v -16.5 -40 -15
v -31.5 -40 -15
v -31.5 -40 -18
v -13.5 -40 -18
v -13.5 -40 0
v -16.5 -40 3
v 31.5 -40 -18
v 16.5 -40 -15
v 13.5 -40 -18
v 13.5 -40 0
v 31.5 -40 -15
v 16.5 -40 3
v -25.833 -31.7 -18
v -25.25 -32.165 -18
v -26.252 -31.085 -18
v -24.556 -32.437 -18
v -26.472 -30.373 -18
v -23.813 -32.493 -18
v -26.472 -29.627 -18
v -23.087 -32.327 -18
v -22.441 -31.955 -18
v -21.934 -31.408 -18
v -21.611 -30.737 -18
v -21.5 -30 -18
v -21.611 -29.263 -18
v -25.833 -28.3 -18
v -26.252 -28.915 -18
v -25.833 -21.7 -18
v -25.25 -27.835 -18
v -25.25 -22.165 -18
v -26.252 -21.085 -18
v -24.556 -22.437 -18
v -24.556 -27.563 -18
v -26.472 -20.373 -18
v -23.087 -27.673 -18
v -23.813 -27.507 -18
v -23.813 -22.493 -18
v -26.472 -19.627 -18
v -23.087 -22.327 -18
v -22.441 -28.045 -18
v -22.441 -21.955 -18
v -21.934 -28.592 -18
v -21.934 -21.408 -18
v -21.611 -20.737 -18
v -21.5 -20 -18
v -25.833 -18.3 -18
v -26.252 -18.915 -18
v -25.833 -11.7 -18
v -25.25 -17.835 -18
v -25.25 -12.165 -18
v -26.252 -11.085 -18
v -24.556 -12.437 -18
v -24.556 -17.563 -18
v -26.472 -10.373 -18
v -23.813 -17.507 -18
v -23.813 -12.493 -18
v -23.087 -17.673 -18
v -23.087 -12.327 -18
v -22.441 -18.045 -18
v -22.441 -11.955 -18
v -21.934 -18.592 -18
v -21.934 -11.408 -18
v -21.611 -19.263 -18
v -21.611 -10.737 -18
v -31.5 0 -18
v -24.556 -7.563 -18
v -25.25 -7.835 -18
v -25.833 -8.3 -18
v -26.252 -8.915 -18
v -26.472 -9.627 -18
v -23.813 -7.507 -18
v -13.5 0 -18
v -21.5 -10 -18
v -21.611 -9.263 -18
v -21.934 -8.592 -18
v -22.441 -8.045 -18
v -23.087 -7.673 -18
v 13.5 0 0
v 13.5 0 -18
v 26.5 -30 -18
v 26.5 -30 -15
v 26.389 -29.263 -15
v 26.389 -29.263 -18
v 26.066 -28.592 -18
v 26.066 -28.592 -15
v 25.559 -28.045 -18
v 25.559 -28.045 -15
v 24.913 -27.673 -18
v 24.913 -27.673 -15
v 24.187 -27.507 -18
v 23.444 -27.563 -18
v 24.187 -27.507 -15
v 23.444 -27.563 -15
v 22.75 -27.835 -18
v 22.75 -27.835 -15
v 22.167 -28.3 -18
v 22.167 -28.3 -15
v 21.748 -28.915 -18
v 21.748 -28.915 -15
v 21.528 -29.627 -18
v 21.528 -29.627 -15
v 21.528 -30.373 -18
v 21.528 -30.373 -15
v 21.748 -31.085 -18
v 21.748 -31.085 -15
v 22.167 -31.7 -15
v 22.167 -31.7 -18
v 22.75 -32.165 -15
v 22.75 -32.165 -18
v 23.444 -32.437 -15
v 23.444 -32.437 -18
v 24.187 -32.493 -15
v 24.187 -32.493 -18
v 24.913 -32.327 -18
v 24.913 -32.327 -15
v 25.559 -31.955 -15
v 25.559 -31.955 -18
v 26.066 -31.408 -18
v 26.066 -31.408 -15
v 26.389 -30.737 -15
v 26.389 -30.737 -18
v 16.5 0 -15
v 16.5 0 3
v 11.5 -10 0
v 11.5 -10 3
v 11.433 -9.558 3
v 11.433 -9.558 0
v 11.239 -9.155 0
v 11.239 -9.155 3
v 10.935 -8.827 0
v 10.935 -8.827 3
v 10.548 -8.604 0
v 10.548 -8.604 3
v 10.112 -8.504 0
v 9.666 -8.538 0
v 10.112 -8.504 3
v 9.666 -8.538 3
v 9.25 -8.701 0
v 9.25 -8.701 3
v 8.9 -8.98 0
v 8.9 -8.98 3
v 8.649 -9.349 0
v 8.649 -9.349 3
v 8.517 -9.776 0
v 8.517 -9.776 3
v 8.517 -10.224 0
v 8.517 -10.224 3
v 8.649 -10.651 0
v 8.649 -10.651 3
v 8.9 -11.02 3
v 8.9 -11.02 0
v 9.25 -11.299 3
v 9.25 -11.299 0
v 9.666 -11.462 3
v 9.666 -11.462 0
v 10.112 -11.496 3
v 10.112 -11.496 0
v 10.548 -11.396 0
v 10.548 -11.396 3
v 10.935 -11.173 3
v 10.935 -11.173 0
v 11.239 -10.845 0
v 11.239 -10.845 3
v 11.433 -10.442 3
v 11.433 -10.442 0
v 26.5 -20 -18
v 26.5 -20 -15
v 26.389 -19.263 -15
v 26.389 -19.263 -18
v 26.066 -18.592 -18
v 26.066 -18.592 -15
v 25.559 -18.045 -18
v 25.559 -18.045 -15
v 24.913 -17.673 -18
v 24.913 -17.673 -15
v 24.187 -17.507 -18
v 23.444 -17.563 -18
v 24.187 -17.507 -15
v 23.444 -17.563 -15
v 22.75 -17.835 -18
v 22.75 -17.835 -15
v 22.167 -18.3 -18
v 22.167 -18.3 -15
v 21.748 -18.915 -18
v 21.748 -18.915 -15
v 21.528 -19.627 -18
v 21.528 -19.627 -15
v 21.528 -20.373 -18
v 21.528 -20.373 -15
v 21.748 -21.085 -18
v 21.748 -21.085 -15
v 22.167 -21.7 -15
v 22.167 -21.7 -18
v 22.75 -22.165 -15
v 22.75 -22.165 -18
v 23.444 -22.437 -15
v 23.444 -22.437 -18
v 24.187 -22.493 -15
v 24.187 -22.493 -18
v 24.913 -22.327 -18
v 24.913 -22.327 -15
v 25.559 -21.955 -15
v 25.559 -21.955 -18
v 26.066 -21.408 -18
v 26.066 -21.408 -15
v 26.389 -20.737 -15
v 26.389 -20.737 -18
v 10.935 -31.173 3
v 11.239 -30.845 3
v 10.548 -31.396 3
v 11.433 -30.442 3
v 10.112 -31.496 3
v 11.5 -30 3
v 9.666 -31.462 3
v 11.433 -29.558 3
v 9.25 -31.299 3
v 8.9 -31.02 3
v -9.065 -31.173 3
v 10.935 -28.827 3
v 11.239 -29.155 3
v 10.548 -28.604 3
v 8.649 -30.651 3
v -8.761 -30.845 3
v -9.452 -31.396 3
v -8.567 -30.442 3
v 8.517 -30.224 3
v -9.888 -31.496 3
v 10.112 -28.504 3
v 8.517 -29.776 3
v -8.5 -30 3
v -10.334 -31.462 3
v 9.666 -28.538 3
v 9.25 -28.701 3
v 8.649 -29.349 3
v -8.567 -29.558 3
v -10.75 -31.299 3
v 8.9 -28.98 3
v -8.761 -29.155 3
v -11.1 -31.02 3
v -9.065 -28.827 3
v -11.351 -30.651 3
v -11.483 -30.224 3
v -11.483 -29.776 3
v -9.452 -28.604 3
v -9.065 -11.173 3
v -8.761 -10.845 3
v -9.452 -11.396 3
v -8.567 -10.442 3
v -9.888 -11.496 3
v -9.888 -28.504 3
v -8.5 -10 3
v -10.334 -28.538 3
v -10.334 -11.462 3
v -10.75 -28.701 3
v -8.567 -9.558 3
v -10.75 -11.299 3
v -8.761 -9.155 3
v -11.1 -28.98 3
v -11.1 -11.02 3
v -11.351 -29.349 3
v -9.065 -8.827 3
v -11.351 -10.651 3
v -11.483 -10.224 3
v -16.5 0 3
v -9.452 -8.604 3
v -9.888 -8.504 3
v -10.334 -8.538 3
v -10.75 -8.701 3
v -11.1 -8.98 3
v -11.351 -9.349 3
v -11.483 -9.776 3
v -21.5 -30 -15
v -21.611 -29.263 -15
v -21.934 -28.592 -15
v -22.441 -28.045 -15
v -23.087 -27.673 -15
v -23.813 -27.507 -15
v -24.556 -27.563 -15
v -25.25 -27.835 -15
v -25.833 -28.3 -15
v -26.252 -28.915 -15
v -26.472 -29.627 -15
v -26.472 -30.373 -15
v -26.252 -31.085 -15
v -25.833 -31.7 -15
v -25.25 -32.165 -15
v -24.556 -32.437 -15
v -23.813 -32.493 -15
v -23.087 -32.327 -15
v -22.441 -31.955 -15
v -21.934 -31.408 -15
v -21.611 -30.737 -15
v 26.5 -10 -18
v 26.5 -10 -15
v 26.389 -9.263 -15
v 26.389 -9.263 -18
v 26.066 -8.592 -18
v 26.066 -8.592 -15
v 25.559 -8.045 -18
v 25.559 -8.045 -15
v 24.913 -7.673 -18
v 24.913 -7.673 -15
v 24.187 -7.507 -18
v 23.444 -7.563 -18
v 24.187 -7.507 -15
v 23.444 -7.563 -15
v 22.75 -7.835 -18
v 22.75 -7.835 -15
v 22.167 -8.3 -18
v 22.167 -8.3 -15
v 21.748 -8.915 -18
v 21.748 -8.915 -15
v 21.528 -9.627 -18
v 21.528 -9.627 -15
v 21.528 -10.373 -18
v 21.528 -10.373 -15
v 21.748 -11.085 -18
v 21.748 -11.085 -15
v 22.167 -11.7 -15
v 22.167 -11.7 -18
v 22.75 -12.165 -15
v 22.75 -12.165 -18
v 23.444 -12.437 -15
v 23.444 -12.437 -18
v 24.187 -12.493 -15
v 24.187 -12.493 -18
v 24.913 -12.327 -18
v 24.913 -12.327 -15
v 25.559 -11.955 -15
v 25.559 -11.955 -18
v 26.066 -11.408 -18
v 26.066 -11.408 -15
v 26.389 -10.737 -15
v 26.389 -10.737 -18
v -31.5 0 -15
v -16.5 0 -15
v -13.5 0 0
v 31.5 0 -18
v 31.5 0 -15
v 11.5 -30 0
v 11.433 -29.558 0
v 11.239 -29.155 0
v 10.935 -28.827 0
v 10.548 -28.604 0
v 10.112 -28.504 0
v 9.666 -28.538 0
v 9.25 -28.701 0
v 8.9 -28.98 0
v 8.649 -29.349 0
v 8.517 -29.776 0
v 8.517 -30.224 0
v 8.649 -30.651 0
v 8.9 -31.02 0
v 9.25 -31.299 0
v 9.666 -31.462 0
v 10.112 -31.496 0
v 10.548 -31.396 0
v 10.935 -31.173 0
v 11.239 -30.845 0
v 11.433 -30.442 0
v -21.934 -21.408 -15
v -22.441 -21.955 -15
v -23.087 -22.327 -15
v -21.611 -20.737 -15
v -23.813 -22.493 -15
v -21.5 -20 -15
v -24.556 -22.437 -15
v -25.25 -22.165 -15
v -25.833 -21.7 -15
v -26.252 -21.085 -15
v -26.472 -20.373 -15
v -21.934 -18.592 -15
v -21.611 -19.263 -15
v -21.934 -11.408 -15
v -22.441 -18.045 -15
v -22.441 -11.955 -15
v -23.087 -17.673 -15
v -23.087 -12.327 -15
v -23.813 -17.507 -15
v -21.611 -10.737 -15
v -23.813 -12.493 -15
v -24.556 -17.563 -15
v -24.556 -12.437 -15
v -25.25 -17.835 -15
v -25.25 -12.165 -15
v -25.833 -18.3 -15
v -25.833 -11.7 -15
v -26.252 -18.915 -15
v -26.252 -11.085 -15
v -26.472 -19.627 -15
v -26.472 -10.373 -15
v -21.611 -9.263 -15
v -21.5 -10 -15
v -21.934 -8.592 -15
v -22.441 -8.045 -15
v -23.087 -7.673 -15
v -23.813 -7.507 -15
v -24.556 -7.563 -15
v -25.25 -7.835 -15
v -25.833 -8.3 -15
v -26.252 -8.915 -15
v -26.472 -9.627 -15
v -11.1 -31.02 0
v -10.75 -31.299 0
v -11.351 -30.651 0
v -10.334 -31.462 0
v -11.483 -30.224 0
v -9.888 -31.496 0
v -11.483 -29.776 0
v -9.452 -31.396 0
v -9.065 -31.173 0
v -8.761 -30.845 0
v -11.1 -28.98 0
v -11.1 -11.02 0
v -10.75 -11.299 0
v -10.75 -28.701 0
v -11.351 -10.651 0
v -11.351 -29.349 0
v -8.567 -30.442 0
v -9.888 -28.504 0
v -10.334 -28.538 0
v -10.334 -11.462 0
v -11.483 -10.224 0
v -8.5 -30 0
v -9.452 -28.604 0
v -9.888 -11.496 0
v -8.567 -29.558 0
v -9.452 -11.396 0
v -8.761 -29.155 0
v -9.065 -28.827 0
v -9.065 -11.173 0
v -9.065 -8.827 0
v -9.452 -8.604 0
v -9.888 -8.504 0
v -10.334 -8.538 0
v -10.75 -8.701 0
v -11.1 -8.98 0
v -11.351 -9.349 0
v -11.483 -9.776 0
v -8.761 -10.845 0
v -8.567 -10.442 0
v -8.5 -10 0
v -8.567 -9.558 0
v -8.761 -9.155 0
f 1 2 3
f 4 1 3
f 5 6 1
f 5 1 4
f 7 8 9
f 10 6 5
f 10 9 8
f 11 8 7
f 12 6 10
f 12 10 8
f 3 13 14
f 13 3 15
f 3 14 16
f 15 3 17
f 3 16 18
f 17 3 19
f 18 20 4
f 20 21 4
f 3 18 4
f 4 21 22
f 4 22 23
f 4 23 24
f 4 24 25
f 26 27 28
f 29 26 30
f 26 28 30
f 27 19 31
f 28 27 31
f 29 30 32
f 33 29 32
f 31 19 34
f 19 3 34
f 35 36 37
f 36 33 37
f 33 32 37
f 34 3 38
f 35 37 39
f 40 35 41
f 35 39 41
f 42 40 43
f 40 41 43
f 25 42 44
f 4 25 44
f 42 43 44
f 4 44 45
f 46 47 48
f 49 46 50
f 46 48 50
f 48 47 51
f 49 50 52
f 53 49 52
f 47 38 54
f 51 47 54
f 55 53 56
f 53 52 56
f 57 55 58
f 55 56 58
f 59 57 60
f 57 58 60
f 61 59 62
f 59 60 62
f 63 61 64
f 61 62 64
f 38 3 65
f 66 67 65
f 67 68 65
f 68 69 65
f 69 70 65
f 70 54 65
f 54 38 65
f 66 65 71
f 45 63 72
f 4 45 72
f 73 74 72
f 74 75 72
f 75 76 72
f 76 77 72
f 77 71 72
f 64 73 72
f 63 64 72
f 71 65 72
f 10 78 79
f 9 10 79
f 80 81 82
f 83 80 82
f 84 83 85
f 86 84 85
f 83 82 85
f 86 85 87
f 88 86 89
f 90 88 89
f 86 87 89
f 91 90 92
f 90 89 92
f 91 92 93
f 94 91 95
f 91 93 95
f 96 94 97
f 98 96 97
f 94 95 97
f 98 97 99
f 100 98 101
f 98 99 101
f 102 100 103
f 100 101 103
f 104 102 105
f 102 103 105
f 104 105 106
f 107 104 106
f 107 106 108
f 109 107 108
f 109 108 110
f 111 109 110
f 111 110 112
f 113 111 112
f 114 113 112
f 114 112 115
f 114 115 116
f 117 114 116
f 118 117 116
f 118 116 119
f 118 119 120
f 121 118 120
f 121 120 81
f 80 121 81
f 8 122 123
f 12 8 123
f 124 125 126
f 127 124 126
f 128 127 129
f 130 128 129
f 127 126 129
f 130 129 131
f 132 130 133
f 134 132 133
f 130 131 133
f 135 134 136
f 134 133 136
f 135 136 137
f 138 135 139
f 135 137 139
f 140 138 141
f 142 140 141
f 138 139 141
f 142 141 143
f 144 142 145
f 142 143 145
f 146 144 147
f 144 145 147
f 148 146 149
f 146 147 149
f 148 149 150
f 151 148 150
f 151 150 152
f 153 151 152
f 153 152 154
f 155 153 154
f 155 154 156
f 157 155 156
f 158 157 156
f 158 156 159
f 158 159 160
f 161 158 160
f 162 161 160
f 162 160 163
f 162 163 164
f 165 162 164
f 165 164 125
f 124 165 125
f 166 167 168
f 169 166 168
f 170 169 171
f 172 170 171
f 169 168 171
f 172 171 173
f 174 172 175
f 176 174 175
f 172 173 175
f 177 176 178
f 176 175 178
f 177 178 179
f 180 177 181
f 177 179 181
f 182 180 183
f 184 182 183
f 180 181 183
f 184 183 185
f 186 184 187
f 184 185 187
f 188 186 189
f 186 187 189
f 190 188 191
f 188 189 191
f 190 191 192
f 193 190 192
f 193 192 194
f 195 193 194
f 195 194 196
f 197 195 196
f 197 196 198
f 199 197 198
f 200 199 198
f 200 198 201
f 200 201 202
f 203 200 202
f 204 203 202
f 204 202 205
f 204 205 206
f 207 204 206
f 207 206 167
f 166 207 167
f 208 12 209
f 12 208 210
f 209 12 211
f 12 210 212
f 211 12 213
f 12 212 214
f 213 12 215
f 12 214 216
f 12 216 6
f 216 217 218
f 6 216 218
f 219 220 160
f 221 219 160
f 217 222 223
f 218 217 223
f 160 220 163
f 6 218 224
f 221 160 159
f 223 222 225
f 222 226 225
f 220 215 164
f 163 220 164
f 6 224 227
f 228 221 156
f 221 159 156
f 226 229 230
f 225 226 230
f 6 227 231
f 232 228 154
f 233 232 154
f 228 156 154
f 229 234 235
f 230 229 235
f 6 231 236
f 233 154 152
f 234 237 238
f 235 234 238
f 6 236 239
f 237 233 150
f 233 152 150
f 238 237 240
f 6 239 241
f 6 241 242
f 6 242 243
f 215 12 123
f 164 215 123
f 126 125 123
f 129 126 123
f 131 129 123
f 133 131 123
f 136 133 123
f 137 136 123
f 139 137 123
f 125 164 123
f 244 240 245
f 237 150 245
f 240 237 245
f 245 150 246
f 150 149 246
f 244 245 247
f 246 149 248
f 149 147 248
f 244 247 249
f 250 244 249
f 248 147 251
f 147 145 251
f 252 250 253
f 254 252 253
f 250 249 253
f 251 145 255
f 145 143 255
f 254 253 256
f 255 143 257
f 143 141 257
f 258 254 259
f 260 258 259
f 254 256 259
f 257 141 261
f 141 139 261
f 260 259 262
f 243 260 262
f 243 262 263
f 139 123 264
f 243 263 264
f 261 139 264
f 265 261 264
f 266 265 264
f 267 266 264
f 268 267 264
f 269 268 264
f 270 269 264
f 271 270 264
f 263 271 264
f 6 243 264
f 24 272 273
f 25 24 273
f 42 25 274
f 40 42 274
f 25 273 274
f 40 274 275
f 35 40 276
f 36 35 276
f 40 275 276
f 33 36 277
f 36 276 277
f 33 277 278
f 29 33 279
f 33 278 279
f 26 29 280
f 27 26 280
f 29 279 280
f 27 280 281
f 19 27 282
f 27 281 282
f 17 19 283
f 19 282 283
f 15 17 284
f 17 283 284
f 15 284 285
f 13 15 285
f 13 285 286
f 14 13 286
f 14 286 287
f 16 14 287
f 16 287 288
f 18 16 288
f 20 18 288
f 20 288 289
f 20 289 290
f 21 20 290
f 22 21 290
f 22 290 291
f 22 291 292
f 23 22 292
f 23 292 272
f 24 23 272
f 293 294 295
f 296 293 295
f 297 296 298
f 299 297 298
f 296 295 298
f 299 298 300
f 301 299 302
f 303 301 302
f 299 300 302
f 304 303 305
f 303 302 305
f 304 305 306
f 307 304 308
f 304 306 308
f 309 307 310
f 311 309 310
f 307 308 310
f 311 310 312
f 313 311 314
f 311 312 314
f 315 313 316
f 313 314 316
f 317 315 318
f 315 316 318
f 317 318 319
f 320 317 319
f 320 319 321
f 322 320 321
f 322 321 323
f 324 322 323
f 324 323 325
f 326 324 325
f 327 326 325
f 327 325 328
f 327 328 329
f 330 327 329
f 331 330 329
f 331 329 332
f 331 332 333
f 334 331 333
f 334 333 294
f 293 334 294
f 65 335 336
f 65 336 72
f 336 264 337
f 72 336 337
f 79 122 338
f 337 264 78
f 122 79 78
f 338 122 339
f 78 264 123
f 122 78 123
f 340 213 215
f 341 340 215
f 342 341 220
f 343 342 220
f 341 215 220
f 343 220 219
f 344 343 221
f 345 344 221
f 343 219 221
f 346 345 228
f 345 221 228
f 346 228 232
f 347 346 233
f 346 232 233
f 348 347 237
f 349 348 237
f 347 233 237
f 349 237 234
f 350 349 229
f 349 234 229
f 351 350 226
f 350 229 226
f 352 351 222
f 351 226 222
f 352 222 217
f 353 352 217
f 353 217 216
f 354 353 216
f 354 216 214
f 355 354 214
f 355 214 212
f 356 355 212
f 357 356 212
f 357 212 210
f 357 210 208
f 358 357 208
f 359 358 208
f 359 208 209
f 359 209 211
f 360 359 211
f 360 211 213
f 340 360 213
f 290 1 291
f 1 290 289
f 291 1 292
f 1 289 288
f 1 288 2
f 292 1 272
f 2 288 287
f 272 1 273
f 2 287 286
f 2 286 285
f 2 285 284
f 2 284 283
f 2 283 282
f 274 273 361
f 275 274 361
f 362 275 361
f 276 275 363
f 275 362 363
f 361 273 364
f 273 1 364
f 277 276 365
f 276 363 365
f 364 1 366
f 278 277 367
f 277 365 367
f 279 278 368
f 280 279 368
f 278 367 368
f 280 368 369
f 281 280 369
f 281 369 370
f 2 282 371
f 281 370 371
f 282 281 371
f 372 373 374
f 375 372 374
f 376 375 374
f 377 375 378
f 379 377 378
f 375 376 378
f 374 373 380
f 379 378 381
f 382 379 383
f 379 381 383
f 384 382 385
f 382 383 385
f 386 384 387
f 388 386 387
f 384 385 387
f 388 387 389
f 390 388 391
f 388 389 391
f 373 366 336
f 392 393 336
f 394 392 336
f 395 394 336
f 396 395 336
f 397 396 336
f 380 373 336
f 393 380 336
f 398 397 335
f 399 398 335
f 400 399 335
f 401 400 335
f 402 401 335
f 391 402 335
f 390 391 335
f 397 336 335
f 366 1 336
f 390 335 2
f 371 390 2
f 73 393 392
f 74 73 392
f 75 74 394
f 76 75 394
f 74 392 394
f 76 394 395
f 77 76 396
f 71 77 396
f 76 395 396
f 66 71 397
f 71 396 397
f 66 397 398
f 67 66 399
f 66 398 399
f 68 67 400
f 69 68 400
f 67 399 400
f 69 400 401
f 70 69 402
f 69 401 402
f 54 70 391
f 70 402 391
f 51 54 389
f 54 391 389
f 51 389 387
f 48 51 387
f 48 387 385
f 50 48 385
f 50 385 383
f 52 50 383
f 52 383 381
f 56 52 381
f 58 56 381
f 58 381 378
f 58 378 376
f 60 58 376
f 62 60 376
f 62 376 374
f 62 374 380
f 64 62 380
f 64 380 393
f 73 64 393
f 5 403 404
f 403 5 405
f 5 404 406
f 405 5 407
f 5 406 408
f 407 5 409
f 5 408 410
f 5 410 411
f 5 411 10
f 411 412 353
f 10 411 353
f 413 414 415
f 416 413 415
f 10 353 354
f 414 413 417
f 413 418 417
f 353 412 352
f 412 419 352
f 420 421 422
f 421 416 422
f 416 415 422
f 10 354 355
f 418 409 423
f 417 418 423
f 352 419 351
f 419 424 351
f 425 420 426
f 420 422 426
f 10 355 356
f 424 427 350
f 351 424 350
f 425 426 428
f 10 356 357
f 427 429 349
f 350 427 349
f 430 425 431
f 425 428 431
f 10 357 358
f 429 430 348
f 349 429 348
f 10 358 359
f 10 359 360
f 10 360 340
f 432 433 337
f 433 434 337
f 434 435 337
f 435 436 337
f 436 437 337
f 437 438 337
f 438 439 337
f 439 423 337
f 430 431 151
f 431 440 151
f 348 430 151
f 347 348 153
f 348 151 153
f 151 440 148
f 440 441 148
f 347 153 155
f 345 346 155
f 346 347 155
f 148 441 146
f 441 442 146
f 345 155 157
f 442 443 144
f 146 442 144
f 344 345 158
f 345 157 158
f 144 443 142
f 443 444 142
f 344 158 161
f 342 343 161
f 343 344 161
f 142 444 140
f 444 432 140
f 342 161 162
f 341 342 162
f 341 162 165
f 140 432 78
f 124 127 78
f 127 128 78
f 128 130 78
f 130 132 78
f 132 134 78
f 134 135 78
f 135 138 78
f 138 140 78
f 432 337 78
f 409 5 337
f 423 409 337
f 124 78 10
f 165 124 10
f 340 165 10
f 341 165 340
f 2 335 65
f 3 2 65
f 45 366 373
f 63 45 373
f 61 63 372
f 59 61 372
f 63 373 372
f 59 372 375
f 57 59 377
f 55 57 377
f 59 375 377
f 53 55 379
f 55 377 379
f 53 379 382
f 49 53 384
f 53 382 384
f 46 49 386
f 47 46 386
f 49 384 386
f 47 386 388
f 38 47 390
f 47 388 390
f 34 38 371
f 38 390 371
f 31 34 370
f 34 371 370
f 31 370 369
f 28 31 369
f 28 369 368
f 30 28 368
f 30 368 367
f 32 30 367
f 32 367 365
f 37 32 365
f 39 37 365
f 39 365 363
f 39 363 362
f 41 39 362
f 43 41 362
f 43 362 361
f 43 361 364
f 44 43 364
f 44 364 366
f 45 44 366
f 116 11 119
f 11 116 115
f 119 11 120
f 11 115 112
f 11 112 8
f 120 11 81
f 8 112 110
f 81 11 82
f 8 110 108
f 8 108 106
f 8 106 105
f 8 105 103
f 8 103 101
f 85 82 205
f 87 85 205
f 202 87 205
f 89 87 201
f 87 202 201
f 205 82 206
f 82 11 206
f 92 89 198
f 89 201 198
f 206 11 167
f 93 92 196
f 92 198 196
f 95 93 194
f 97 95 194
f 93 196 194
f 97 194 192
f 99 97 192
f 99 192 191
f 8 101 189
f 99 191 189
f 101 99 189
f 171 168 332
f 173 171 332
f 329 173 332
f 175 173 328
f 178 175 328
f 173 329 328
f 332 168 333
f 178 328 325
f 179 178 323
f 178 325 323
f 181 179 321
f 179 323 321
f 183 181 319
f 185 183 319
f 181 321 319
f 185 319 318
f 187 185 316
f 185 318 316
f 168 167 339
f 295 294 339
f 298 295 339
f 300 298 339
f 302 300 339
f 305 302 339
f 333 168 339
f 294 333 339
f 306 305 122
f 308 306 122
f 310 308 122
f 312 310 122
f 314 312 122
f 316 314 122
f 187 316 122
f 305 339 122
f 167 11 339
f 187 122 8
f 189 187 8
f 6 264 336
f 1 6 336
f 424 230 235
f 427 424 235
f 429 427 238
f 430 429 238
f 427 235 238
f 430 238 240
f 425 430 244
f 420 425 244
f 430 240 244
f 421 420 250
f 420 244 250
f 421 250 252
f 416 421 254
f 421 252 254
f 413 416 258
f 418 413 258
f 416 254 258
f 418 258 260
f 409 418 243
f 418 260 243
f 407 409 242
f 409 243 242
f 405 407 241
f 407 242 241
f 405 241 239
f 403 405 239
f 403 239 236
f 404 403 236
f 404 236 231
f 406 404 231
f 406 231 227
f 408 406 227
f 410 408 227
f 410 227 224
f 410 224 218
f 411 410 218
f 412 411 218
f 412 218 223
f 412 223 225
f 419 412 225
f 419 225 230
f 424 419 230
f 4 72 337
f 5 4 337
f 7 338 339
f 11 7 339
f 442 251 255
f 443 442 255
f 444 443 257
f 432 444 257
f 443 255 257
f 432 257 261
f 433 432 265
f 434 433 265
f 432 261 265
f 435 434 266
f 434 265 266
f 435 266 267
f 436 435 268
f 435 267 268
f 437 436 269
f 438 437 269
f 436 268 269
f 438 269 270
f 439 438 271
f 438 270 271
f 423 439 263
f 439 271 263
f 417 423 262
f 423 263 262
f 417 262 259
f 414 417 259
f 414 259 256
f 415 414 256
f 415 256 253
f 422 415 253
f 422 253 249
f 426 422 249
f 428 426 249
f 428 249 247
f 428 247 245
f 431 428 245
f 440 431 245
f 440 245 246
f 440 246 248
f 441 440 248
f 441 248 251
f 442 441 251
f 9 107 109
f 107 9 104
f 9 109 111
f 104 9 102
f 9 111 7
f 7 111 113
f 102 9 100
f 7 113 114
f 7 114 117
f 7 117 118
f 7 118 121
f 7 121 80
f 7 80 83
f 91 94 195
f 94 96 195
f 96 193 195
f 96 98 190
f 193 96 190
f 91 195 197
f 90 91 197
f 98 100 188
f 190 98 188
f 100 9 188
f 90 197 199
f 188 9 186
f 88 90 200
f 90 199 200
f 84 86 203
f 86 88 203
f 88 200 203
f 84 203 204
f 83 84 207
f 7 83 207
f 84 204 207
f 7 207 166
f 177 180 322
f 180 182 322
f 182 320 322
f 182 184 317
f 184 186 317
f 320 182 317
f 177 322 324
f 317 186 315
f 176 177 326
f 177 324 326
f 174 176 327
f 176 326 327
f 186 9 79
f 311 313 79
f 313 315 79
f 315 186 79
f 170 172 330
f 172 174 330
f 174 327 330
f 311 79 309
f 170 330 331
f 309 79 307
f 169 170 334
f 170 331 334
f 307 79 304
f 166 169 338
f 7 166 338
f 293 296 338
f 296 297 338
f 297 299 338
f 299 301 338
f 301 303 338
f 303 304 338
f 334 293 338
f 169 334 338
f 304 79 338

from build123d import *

# Parameters (mm, degrees)
F1_DEPTH = 40
F2_R     = 1.5
F3_DEPTH = 25
F4_R     = 2.5
F5_DEPTH = 25
F6_R     = 2.5
F7_DEPTH = 25


with BuildPart() as f1:
    # F0 (on Front) → F1 (new body)
    with BuildSketch(Plane.XZ):
        Polygon((-13.5, 0), (0, 0), (13.5, 0), (13.5, -18), (31.5, -18), (31.5, -15), (16.5, -15), (16.5, 3), (0, 3), (-16.5, 3), (-16.5, -15), (-31.5, -15), (-31.5, -18), (-13.5, -18), align=None)
    extrude(amount=F1_DEPTH)

    # F2 (on face) → F3 (cut)
    with BuildSketch(Plane.XY.offset(3)):
        with Locations((-10, -10)):
            Circle(F2_R)
        with Locations((10, -10)):
            Circle(F2_R)
        with Locations((10, -30)):
            Circle(F2_R)
        with Locations((-10, -30)):
            Circle(F2_R)
    extrude(amount=-F3_DEPTH, mode=Mode.SUBTRACT)

    # F4 (on face) → F5 (cut)
    with BuildSketch(Plane.XY.offset(-15)):
        with Locations((-24, -30)):
            Circle(F4_R)
        with Locations((-24, -20)):
            Circle(F4_R)
        with Locations((-24, -10)):
            Circle(F4_R)
    extrude(amount=-F5_DEPTH, mode=Mode.SUBTRACT)

    # F6 (on face) → F7 (cut)
    with BuildSketch(Plane.XY.offset(-15)):
        with Locations((24, -30)):
            Circle(F6_R)
        with Locations((24, -20)):
            Circle(F6_R)
        with Locations((24, -10)):
            Circle(F6_R)
    extrude(amount=-F7_DEPTH, mode=Mode.SUBTRACT)


solid = f1.part
